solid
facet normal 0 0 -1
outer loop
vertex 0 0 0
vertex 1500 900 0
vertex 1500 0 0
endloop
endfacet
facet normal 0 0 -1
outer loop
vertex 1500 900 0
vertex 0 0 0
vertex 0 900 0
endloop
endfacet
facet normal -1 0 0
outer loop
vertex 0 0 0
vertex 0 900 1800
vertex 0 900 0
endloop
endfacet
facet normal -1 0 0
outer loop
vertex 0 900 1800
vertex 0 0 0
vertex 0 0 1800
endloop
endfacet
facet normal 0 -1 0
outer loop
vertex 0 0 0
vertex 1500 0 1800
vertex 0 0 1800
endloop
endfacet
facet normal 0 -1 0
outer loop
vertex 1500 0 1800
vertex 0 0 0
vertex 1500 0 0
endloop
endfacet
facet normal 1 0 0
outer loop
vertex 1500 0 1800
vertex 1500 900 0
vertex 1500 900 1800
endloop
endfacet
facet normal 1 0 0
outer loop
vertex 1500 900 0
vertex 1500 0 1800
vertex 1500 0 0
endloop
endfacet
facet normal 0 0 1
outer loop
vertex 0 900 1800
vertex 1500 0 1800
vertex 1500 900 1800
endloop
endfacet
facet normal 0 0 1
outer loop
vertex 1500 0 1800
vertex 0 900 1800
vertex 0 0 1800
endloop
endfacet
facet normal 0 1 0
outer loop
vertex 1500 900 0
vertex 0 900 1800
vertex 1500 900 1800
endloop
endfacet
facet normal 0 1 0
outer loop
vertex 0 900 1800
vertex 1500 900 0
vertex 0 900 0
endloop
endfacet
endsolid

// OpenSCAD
max_external_dimensions = [1500, 900, 1800];
original_kart_bounds = [1010, 590, 500];

color([0, 1, 0])
  cube(original_kart_bounds);

color([0, 1, 1, 0.5])
  cube(max_external_dimensions);
